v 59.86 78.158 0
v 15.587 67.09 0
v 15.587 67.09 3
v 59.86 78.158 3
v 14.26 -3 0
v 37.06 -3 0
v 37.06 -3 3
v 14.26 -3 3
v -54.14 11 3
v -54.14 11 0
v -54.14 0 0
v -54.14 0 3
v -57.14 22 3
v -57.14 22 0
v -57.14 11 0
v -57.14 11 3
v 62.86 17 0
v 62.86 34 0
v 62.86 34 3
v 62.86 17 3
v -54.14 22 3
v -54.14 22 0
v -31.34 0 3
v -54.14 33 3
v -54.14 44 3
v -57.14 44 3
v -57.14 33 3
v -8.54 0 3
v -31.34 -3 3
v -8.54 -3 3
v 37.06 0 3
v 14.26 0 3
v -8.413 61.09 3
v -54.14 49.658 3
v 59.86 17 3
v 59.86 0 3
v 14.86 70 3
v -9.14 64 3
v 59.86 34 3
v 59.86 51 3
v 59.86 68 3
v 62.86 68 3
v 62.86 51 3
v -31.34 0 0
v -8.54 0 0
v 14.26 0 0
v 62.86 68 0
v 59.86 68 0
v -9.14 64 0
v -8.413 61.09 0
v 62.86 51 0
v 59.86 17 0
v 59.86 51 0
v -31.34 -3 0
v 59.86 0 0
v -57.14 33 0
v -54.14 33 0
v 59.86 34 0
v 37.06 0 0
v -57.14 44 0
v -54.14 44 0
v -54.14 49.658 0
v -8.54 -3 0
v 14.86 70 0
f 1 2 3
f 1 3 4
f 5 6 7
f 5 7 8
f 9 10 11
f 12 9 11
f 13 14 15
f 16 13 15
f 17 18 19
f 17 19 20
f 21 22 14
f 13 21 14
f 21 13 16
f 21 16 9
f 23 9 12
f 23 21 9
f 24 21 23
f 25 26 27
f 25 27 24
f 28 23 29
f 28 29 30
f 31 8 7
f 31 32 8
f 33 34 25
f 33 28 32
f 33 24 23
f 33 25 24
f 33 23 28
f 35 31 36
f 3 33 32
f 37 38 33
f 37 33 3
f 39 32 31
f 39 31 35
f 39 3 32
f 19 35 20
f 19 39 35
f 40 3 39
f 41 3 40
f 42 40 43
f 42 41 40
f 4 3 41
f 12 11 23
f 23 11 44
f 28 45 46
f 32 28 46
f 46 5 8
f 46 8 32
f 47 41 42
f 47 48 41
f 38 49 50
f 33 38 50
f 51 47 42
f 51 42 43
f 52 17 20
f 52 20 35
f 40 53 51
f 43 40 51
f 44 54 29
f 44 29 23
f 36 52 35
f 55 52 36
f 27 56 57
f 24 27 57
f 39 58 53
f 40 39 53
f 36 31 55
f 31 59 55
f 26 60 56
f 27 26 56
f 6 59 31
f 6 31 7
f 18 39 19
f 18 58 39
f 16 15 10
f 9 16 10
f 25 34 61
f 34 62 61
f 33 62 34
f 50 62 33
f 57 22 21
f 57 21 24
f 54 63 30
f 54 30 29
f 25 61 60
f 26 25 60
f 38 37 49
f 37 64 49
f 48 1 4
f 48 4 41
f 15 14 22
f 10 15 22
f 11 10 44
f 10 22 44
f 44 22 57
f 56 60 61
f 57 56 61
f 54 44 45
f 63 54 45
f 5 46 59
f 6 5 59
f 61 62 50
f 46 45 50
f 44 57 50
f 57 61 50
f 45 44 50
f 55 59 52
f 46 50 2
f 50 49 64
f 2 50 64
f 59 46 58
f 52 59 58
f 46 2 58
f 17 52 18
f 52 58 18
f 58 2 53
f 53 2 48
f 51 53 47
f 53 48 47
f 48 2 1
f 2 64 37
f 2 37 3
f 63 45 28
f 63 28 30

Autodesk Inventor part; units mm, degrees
ref_plane "YZ Plane" through (0, 0, 0) normal (1, 0, 0) x (0, 1, 0)
ref_plane "XZ Plane" through (0, 0, 0) normal (0, 1, 0) x (-1, 0, 0)
ref_plane "XY Plane" through (0, 0, 0) normal (0, 0, 1) x (1, 0, 0)
sketch "Sketch1" plane through (0, 0, 0) normal (0, 0, 1) x (1, 0, 0)
  line L0 (14.8597, 70) -> (-9.1403, 64)
  line L1 (59.8597, 68) -> (62.8597, 68)
  line L2 (62.8597, 68) -> (62.8597, 51)
  line L3 (62.8597, 17) -> (59.8597, 17)
  line L4 (59.8597, 51) -> (62.8597, 51)
  line L5 (62.8597, 34) -> (62.8597, 17)
  line L6 (-54.1403, 22) -> (-57.1403, 22)
  line L7 (-57.1403, 22) -> (-57.1403, 11)
  line L8 (-57.1403, 11) -> (-54.1403, 11)
  line L9 (-54.1403, 44) -> (-57.1403, 44)
  line L10 (-57.1403, 44) -> (-57.1403, 33)
  line L11 (-57.1403, 33) -> (-54.1403, 33)
  line L12 (-8.5403, 0) -> (-8.5403, -3)
  line L13 (-8.5403, -3) -> (-31.3403, -3)
  line L14 (-31.3403, -3) -> (-31.3403, 0)
  line L15 (32.3597, 0) -> (37.0597, 0)
  line L16 (37.0597, 0) -> (37.0597, -3)
  line L17 (37.0597, -3) -> (14.2597, -3)
  line L18 (14.2597, -3) -> (14.2597, 0)
  line L19 (14.8597, 70) -> (15.5873, 67.0896)
  line L20 (-9.1403, 64) -> (-8.4127, 61.0896)
  line L21 (-54.1403, 22) -> (-54.1403, 33)
  line L22 (59.8597, 17) -> (59.8597, 0)
  line L23 (59.8597, 78.1577) -> (59.8597, 68)
  line L24 (59.8597, 34) -> (59.8597, 51)
  line L25 (-54.1403, 0) -> (-31.3403, 0)
  line L26 (-8.5403, 0) -> (14.2597, 0)
  line L27 (37.0597, 0) -> (59.8597, 0)
  line L28 (-54.1403, 49.6577) -> (-54.1403, 44)
  line L29 (-54.1403, 33) -> (-54.1403, 22)
  line L30 (-54.1403, 33) -> (-54.1403, 22)
  line L31 (-54.1403, 11) -> (-54.1403, 0)
  line L32 (14.8597, 70) -> (-57.1403, 52) construction
  line L33 (-57.1403, 44) -> (-57.1403, 60) construction
  line L34 (-54.1403, 49.6577) -> (-8.4127, 61.0896)
  line L35 (15.5873, 67.0896) -> (59.8597, 78.1577)
  line L36 (59.8597, 34) -> (62.8597, 34)
  line L37 (14.8597, 70) -> (98.136, 90.8191) construction
  line L38 (62.8597, 68) -> (62.8597, 104.4948) construction
  point P0 (0, 0)
  point P1 (62.8597, 82)
  dimension "d3" = 11
  dimension "d4" = 0
  dimension "d5" = 55
  dimension "d6" = 3
  dimension "d8" = 8.5403
  dimension "d9" = 22.8
  dimension "d10" = 3
  dimension "d11" = 3
  dimension "d12" = 114
  dimension "d13" = 24.7386
  dimension "d14" = 3
  dimension "d17" = 17
  dimension "d20" = 22.8
  dimension "d21" = 22.8
  dimension "d22" = 22.8
  dimension "d23" = 82
  dimension "d24" = 48
  dimension "d25" = 48
  dimension "d26" = 17
  dimension "d27" = 11
extrude "Extrusion1" add sketch "Sketch1" along normal blind 3
equation "\"d6\" = tt"
equation "\"d9\" = -0.4 * tt + 0.2 * ht + 2 * tol"
equation "\"d10\" = tt"
equation "\"d11\" = tt"
equation "\"d12\" = -2 * tt + ht"
equation "\"d13\" = 0.2 * d"
equation "\"d14\" = tt"
equation "\"d24\" = d25"
equation "\"d18\" = tt"
equation "\"d0\" = tt"
equation "\"tt\" = 3"
equation "\"tol\" = 0"
equation "\"tiroir\" = 1"
equation "\"nHoles\" = 4"
equation "\"shelfH\" = 35"
equation "\"ht\" = 120"
equation "\"d\" = 123.693169"
properties part number "glass_separator"
